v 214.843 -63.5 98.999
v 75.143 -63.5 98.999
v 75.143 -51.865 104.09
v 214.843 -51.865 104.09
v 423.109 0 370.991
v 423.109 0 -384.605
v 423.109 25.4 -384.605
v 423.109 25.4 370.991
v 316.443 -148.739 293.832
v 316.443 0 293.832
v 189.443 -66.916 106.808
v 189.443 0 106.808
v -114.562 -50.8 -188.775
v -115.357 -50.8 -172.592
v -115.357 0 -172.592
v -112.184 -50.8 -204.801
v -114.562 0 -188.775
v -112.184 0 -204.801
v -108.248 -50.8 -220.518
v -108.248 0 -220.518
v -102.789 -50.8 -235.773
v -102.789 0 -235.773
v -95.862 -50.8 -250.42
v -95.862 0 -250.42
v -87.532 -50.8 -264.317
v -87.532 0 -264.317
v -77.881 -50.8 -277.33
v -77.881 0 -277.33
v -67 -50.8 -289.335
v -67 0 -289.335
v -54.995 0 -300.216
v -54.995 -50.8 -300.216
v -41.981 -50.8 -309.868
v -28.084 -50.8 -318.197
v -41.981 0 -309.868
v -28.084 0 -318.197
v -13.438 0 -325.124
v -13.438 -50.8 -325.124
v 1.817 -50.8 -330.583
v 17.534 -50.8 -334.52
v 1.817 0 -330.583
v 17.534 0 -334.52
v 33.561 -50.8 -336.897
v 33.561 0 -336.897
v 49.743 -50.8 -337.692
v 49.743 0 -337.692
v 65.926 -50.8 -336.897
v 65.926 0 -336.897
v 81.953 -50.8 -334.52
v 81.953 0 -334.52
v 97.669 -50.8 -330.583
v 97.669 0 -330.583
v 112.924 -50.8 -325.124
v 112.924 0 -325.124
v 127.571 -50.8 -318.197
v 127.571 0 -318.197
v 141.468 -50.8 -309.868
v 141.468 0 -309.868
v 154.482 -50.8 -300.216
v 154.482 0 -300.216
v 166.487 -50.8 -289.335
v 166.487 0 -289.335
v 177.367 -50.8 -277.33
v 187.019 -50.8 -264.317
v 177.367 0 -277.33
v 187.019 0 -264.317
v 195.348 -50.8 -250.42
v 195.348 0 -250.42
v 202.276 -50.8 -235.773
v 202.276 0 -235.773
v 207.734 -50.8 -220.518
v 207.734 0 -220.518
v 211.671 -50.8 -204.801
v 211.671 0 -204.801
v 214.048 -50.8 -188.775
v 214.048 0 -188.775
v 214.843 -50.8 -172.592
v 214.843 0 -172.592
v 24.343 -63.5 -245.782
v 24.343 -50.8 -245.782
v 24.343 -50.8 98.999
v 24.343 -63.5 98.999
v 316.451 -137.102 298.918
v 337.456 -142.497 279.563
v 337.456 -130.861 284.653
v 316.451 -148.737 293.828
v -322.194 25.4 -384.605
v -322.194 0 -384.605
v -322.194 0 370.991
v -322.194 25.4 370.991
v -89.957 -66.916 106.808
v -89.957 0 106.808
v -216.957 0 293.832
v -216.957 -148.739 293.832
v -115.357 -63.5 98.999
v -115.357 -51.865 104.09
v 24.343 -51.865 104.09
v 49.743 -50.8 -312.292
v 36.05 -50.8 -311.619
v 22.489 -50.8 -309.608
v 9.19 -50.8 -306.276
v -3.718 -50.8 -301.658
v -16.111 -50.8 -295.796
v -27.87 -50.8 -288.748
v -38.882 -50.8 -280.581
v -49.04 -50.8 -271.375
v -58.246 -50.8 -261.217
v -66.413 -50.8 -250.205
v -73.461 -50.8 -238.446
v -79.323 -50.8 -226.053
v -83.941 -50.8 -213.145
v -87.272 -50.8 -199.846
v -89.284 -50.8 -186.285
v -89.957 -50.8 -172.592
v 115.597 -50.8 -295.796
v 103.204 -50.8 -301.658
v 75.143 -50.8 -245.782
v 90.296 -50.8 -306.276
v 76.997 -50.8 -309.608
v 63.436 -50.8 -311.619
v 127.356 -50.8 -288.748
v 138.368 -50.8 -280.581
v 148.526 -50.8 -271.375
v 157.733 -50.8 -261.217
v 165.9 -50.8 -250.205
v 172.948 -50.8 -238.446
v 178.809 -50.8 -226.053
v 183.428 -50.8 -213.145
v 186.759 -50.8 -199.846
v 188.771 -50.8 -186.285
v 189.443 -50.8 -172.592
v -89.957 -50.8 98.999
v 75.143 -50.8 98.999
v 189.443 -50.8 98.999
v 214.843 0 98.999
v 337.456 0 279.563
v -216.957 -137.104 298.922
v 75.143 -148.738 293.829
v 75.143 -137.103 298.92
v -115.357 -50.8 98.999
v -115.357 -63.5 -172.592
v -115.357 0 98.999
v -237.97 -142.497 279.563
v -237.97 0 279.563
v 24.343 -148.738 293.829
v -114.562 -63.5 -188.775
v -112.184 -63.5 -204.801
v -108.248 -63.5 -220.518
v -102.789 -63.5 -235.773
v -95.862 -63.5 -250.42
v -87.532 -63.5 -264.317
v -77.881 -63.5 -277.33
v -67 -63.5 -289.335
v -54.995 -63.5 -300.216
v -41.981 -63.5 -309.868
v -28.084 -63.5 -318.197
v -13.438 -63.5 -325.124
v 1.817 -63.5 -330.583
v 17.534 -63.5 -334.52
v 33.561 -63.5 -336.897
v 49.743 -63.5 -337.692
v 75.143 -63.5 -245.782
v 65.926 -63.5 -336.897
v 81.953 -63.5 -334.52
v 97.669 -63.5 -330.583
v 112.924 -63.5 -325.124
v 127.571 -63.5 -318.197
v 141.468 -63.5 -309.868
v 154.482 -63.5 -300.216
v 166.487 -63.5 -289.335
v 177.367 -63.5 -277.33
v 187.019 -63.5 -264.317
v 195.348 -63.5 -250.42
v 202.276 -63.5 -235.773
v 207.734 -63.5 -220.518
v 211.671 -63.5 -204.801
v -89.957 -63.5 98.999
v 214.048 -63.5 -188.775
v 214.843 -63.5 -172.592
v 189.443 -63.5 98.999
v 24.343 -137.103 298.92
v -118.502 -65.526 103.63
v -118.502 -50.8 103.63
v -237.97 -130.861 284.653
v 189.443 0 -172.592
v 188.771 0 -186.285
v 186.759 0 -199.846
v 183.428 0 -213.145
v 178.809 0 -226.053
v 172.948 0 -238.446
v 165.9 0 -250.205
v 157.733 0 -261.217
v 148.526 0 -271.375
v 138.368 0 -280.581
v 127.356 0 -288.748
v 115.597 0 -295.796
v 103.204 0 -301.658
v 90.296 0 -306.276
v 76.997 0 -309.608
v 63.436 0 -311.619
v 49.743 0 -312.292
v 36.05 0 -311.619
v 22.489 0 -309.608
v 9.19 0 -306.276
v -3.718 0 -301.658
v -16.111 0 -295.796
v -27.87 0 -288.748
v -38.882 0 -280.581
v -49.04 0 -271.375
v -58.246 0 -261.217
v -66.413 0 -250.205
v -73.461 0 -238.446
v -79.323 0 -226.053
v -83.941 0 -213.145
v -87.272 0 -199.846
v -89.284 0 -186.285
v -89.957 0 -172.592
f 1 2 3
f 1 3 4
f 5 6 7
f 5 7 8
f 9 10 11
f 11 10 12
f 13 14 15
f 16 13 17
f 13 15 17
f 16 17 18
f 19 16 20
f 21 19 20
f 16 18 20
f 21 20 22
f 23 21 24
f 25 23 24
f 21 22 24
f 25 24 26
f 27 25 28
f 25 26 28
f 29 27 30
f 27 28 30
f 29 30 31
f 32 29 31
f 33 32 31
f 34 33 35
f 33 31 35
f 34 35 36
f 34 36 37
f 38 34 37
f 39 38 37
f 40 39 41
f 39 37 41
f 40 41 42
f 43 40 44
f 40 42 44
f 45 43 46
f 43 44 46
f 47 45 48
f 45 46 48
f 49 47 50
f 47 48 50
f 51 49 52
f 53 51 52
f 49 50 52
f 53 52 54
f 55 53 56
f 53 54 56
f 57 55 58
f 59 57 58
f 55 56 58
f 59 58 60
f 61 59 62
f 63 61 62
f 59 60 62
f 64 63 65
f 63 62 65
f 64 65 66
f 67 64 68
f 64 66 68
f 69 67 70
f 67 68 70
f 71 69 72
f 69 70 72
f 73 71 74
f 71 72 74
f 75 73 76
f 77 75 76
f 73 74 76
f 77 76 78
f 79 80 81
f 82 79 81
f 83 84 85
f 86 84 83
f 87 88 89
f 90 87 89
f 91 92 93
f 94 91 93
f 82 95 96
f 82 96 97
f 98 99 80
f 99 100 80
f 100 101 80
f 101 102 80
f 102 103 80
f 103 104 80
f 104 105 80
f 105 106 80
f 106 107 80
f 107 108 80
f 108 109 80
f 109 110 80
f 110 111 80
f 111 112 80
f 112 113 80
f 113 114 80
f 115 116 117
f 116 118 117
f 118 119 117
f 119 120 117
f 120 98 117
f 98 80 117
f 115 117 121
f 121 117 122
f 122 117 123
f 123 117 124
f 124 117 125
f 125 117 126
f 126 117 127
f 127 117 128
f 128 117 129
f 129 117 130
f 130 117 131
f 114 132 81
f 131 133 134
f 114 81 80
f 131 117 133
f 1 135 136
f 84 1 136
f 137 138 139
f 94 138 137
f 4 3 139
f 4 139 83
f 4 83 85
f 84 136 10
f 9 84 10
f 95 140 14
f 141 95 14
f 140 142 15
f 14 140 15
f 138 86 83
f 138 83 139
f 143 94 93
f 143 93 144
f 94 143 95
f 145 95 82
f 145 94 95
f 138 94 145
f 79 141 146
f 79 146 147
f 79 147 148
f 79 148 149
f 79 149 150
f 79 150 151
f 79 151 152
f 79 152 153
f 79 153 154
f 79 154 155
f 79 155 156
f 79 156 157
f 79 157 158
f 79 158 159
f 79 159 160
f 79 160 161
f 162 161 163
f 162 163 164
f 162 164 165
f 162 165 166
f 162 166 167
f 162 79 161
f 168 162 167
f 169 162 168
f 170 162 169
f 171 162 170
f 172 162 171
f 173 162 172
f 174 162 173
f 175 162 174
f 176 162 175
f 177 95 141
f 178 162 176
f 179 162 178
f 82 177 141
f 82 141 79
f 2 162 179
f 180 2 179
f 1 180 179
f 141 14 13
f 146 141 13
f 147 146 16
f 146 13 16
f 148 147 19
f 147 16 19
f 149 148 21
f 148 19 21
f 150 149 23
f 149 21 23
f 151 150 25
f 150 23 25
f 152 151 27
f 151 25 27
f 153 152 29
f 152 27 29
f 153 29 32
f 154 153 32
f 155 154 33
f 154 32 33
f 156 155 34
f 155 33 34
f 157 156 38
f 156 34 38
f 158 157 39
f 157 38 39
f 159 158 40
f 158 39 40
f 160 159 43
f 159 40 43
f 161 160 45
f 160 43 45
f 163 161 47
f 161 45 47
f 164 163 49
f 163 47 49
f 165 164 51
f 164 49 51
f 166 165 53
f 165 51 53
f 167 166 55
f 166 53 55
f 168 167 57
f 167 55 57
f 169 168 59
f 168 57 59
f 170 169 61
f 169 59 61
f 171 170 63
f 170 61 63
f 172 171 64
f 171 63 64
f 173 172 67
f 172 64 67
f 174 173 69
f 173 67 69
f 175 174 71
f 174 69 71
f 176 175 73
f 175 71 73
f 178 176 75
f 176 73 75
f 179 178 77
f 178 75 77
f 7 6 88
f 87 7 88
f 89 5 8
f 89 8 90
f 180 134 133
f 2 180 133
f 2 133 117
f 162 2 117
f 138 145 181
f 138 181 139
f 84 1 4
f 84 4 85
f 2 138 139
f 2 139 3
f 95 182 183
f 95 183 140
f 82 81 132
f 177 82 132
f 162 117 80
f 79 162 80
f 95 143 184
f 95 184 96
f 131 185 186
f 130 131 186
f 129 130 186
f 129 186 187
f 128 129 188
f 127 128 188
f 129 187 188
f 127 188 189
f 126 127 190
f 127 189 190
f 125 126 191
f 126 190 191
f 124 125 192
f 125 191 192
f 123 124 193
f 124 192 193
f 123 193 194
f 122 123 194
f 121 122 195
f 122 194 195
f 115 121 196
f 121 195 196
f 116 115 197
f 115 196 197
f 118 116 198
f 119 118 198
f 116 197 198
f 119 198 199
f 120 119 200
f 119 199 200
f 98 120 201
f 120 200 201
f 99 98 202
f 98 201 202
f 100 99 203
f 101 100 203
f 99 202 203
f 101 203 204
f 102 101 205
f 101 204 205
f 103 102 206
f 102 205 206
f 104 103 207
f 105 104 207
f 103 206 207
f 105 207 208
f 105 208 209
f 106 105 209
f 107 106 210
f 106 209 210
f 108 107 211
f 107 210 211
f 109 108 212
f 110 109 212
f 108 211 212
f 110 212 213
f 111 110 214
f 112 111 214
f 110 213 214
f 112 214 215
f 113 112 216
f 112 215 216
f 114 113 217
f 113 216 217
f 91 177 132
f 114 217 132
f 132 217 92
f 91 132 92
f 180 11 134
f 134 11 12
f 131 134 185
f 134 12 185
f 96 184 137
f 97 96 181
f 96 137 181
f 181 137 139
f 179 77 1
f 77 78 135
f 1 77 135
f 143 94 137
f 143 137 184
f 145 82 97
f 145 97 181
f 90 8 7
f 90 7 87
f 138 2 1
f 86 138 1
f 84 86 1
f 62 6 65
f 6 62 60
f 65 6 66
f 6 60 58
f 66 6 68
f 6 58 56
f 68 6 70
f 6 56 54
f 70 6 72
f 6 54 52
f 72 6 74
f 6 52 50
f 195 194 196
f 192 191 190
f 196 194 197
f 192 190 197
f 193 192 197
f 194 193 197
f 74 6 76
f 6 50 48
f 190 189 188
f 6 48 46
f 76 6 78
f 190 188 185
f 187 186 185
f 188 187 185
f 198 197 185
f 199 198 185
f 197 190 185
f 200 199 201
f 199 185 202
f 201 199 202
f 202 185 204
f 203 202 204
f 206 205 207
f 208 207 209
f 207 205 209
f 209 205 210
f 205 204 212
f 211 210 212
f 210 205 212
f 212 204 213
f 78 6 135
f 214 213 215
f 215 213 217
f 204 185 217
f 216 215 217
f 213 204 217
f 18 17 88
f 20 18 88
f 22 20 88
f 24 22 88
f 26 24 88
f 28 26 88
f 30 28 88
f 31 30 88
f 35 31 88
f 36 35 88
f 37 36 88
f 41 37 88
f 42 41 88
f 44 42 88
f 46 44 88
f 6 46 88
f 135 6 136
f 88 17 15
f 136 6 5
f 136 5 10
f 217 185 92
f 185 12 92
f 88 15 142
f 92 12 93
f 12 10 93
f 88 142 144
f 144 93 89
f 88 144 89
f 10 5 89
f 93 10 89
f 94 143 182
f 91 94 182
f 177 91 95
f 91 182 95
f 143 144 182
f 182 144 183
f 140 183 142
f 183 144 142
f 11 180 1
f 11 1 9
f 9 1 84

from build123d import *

# Parameters (mm, degrees)
F1_DEPTH     = 50.8
F2_W         = 745.3036904335
F2_H         = 755.5955052376
F3_DEPTH     = 25.4
F5_DEPTH     = 12.7
F7_DEPTH     = 101.6
F8_T4_DEPTH  = 1078.7585913979
F9_DEPTH     = 101.6
F10_T4_DEPTH = 1078.7585913979
F12_DEPTH    = 12.7


# Not quite as in the source:
# - a fillet or chamfer that OpenCascade refuses, or shapes differently, is made with other operations: its cross-section is extruded or revolved along the edge and cut away or added


with BuildPart() as f1:
    # F0 (on Front) → F1 (new body)
    with BuildSketch(Plane.XZ):
        with BuildLine():
            Line((-89.9567651826, 106.8080672332), (-216.9567651826, 293.8318768854))
            Line((-216.9567651826, 293.8318768854), (-237.969898878, 279.5627419326))
            Line((-237.969898878, 279.5627419326), (-216.9567651826, 248.6182040079))
            Line((-216.9567651826, 248.6182040079), (-115.3567651826, 98.9991562862))
            Line((-115.3567651826, 98.9991562862), (-115.3567651826, -172.5919327668))
            ThreePointArc((-115.3567651826, -172.5919327668), (-67.0000946798, -289.3352624173), (49.7432350342, -337.6919327668))
            ThreePointArc((49.7432350342, -337.6919327668), (166.486564468, -289.335262264), (214.8432348174, -172.5919327668))
            Line((214.8432348174, -172.5919327668), (214.8432348174, 98.9991562862))
            Line((214.8432348174, 98.9991562862), (316.4432348174, 248.6182040079))
            Line((316.4432348174, 248.6182040079), (337.4563685128, 279.5627419326))
            Line((337.4563685128, 279.5627419326), (316.4432348174, 293.8318768854))
            Line((316.4432348174, 293.8318768854), (189.4432348174, 106.8080672332))
            Line((189.4432348174, 106.8080672332), (189.4432348174, -172.5919327668))
            ThreePointArc((189.4432348174, -172.5919327668), (49.7432348174, -312.2919327668), (-89.9567651826, -172.5919327668))
            Line((-89.9567651826, -172.5919327668), (-89.9567651826, 106.8080672332))
        make_face()
    extrude(amount=F1_DEPTH)

    # F2 (on face) → F3 (join)
    with BuildSketch(Plane(origin=(0, 0, 0), x_dir=(-1, 0, 0), z_dir=(0, 1, 0))):
        with Locations((-50.4573881626, -6.8071186543)):
            Rectangle(F2_W, F2_H)
        with BuildLine():
            Line((89.9567651826, 106.8080672332), (216.9567651826, 293.8318768854))
            Line((216.9567651826, 293.8318768854), (237.969898878, 279.5627419326))
            Line((237.969898878, 279.5627419326), (115.3567651826, 98.9991562862))
            Line((115.3567651826, 98.9991562862), (115.3567651826, -172.5919327668))
            ThreePointArc((115.3567651826, -172.5919327668), (-49.7432348174, -337.6919327668), (-214.8432348174, -172.5919327668))
            Line((-214.8432348174, -172.5919327668), (-214.8432348174, 98.9991562862))
            Line((-214.8432348174, 98.9991562862), (-337.4563685128, 279.5627419326))
            Line((-337.4563685128, 279.5627419326), (-316.4432348174, 293.8318768854))
            Line((-316.4432348174, 293.8318768854), (-189.4432348174, 106.8080672332))
            Line((-189.4432348174, 106.8080672332), (-189.4432348174, -172.5919327668))
            ThreePointArc((-189.4432348174, -172.5919327668), (-49.7432348174, -312.2919327668), (89.9567651826, -172.5919327668))
            Line((89.9567651826, -172.5919327668), (89.9567651826, 106.8080672332))
        make_face(mode=Mode.SUBTRACT)
        with BuildLine():
            Line((237.969898878, 279.5627419326), (216.9567651826, 293.8318768854))
            Line((216.9567651826, 293.8318768854), (89.9567651826, 106.8080672332))
            Line((89.9567651826, 106.8080672332), (89.9567651826, -172.5919327668))
            ThreePointArc((89.9567651826, -172.5919327668), (-49.7432348174, -312.2919327668), (-189.4432348174, -172.5919327668))
            Line((-189.4432348174, -172.5919327668), (-189.4432348174, 106.8080672332))
            Line((-189.4432348174, 106.8080672332), (-316.4432348174, 293.8318768854))
            Line((-316.4432348174, 293.8318768854), (-337.4563685128, 279.5627419326))
            Line((-337.4563685128, 279.5627419326), (-214.8432348174, 98.9991562862))
            Line((-214.8432348174, 98.9991562862), (-214.8432348174, -172.5919327668))
            ThreePointArc((-214.8432348174, -172.5919327668), (-49.7432348174, -337.6919327668), (115.3567651826, -172.5919327668))
            Line((115.3567651826, -172.5919327668), (115.3567651826, 98.9991562862))
            Line((115.3567651826, 98.9991562862), (237.969898878, 279.5627419326))
        make_face()
    extrude(amount=F3_DEPTH)

    # F4 (on face) → F5 (join)
    with BuildSketch(Plane.XZ.offset(50.8)):
        with BuildLine():
            Line((24.3432348174, 98.9991562862), (-89.9567651826, 98.9991562862))
            Line((-89.9567651826, 98.9991562862), (-89.9567651826, -172.5919327668))
            ThreePointArc((-89.9567651826, -172.5919327668), (49.7432348174, -312.2919327668), (189.4432348174, -172.5919327668))
            Line((189.4432348174, -172.5919327668), (189.4432348174, 98.9991562862))
            Line((189.4432348174, 98.9991562862), (75.1432348174, 98.9991562862))
            Line((75.1432348174, 98.9991562862), (75.1432348174, -172.5919327668))
            Line((75.1432348174, -172.5919327668), (75.1432348174, -245.7823455334))
            Line((75.1432348174, -245.7823455334), (24.3432348174, -245.7823455334))
            Line((24.3432348174, -245.7823455334), (24.3432348174, -172.5919327668))
            Line((24.3432348174, -172.5919327668), (24.3432348174, 98.9991562862))
        make_face()
        with BuildLine():
            Line((-89.9567651826, -172.5919327668), (-89.9567651826, 98.9991562862))
            Line((-89.9567651826, 98.9991562862), (-115.3567651826, 98.9991562862))
            Line((-115.3567651826, 98.9991562862), (-115.3567651826, -172.5919327668))
            ThreePointArc((-115.3567651826, -172.5919327668), (49.7432348174, -337.6919327668), (214.8432348174, -172.5919327668))
            Line((214.8432348174, -172.5919327668), (214.8432348174, 98.9991562862))
            Line((214.8432348174, 98.9991562862), (189.4432348174, 98.9991562862))
            Line((189.4432348174, 98.9991562862), (189.4432348174, -172.5919327668))
            ThreePointArc((189.4432348174, -172.5919327668), (49.7432348174, -312.2919327668), (-89.9567651826, -172.5919327668))
        make_face()
    extrude(amount=F5_DEPTH)

    # F6 (on face) → F7 (join)
    with BuildSketch(Plane.XZ.offset(50.8)):
        Polygon((-118.501645235, 103.6303960366), (-115.3567651826, 98.9991562862), (-89.9567651826, 98.9991562862), (-89.9567651826, 106.8080672332), (-216.9567651826, 293.8318768854), (-237.969898878, 279.5627419326), align=None)
    extrude(amount=F7_DEPTH)

    # F8: chamfer of 88.9 x 203.2 on 1 edges, made by hand


with BuildPart() as f8_tool2:
    # F8_s3 → F8_t4 (new body)
    with BuildSketch(Plane.YZ.offset(-642.0360608816)):
        Polygon((-152.4, 302.1991562862), (-63.5, 98.9991562862), (-152.4, 98.9991562862), align=None)
    extrude(amount=F8_T4_DEPTH)

    split(bisect_by=Plane.XZ.offset(63.5), keep=Keep.TOP)


with BuildPart() as f1_1:
    add(f1.part)

    # F8_t1: cut F8_tool2
    add(f8_tool2.part, mode=Mode.SUBTRACT)

    # F9 (add): a face of the model
    f9_faces = [f1_1.faces().sort_by_distance(p)[0] for p in [
        (263.3288281635, -50.8, 193.2225963664),
    ]]
    extrude(f9_faces, amount=F9_DEPTH)

    # F10: chamfer of 203.2 x 88.9 on 1 edges, made by hand


with BuildPart() as f10_tool2:
    # F10_s3 → F10_t4 (new body)
    with BuildSketch(Plane.YZ.offset(741.5225305163)):
        Polygon((-63.5, 98.9991562862), (-152.4, 302.1991562862), (-152.4, 98.9991562862), align=None)
    extrude(amount=-F10_T4_DEPTH)

    split(bisect_by=Plane.XZ.offset(63.5), keep=Keep.TOP)


with BuildPart() as f1_2:
    add(f1_1.part)

    # F10_t1: cut F10_tool2
    add(f10_tool2.part, mode=Mode.SUBTRACT)


with BuildPart() as f12:
    # F11 (on face) → F12 (new body)
    with BuildSketch(Plane(origin=(0, -16.9445721179, -7.4132503016), x_dir=(1, 0, 0), z_dir=(0, -0.9161573349, -0.400818834))):
        Polygon((-237.969898878, 313.2387651133), (-115.3567651826, 116.150799141), (-89.9567651826, 116.150799141), (-89.9567651826, 124.6743470618), (-216.9567651826, 328.8137481529), align=None)
        Polygon((-89.9567651826, 124.6743470618), (-89.9567651826, 116.150799141), (24.3432348174, 116.150799141), (24.3432348174, 328.8111325348), (75.1432348174, 328.8111325348), (-216.9567651826, 328.8137481529), align=None)
    extrude(amount=-F12_DEPTH)


with BuildPart() as f12b:
    # F11 (on face) → F12, piece 2 (new body)
    with BuildSketch(Plane(origin=(0, -16.9445721179, -7.4132503016), x_dir=(1, 0, 0), z_dir=(0, -0.9161573349, -0.400818834))):
        Polygon((75.1432348174, 328.8111325348), (75.1432348174, 116.150799141), (214.8432348174, 116.150799141), (337.4563754174, 313.238771741), (316.4505754174, 328.808971741), align=None)
    extrude(amount=-F12_DEPTH)


solid = Compound([f1_2.part, f12.part, f12b.part])
